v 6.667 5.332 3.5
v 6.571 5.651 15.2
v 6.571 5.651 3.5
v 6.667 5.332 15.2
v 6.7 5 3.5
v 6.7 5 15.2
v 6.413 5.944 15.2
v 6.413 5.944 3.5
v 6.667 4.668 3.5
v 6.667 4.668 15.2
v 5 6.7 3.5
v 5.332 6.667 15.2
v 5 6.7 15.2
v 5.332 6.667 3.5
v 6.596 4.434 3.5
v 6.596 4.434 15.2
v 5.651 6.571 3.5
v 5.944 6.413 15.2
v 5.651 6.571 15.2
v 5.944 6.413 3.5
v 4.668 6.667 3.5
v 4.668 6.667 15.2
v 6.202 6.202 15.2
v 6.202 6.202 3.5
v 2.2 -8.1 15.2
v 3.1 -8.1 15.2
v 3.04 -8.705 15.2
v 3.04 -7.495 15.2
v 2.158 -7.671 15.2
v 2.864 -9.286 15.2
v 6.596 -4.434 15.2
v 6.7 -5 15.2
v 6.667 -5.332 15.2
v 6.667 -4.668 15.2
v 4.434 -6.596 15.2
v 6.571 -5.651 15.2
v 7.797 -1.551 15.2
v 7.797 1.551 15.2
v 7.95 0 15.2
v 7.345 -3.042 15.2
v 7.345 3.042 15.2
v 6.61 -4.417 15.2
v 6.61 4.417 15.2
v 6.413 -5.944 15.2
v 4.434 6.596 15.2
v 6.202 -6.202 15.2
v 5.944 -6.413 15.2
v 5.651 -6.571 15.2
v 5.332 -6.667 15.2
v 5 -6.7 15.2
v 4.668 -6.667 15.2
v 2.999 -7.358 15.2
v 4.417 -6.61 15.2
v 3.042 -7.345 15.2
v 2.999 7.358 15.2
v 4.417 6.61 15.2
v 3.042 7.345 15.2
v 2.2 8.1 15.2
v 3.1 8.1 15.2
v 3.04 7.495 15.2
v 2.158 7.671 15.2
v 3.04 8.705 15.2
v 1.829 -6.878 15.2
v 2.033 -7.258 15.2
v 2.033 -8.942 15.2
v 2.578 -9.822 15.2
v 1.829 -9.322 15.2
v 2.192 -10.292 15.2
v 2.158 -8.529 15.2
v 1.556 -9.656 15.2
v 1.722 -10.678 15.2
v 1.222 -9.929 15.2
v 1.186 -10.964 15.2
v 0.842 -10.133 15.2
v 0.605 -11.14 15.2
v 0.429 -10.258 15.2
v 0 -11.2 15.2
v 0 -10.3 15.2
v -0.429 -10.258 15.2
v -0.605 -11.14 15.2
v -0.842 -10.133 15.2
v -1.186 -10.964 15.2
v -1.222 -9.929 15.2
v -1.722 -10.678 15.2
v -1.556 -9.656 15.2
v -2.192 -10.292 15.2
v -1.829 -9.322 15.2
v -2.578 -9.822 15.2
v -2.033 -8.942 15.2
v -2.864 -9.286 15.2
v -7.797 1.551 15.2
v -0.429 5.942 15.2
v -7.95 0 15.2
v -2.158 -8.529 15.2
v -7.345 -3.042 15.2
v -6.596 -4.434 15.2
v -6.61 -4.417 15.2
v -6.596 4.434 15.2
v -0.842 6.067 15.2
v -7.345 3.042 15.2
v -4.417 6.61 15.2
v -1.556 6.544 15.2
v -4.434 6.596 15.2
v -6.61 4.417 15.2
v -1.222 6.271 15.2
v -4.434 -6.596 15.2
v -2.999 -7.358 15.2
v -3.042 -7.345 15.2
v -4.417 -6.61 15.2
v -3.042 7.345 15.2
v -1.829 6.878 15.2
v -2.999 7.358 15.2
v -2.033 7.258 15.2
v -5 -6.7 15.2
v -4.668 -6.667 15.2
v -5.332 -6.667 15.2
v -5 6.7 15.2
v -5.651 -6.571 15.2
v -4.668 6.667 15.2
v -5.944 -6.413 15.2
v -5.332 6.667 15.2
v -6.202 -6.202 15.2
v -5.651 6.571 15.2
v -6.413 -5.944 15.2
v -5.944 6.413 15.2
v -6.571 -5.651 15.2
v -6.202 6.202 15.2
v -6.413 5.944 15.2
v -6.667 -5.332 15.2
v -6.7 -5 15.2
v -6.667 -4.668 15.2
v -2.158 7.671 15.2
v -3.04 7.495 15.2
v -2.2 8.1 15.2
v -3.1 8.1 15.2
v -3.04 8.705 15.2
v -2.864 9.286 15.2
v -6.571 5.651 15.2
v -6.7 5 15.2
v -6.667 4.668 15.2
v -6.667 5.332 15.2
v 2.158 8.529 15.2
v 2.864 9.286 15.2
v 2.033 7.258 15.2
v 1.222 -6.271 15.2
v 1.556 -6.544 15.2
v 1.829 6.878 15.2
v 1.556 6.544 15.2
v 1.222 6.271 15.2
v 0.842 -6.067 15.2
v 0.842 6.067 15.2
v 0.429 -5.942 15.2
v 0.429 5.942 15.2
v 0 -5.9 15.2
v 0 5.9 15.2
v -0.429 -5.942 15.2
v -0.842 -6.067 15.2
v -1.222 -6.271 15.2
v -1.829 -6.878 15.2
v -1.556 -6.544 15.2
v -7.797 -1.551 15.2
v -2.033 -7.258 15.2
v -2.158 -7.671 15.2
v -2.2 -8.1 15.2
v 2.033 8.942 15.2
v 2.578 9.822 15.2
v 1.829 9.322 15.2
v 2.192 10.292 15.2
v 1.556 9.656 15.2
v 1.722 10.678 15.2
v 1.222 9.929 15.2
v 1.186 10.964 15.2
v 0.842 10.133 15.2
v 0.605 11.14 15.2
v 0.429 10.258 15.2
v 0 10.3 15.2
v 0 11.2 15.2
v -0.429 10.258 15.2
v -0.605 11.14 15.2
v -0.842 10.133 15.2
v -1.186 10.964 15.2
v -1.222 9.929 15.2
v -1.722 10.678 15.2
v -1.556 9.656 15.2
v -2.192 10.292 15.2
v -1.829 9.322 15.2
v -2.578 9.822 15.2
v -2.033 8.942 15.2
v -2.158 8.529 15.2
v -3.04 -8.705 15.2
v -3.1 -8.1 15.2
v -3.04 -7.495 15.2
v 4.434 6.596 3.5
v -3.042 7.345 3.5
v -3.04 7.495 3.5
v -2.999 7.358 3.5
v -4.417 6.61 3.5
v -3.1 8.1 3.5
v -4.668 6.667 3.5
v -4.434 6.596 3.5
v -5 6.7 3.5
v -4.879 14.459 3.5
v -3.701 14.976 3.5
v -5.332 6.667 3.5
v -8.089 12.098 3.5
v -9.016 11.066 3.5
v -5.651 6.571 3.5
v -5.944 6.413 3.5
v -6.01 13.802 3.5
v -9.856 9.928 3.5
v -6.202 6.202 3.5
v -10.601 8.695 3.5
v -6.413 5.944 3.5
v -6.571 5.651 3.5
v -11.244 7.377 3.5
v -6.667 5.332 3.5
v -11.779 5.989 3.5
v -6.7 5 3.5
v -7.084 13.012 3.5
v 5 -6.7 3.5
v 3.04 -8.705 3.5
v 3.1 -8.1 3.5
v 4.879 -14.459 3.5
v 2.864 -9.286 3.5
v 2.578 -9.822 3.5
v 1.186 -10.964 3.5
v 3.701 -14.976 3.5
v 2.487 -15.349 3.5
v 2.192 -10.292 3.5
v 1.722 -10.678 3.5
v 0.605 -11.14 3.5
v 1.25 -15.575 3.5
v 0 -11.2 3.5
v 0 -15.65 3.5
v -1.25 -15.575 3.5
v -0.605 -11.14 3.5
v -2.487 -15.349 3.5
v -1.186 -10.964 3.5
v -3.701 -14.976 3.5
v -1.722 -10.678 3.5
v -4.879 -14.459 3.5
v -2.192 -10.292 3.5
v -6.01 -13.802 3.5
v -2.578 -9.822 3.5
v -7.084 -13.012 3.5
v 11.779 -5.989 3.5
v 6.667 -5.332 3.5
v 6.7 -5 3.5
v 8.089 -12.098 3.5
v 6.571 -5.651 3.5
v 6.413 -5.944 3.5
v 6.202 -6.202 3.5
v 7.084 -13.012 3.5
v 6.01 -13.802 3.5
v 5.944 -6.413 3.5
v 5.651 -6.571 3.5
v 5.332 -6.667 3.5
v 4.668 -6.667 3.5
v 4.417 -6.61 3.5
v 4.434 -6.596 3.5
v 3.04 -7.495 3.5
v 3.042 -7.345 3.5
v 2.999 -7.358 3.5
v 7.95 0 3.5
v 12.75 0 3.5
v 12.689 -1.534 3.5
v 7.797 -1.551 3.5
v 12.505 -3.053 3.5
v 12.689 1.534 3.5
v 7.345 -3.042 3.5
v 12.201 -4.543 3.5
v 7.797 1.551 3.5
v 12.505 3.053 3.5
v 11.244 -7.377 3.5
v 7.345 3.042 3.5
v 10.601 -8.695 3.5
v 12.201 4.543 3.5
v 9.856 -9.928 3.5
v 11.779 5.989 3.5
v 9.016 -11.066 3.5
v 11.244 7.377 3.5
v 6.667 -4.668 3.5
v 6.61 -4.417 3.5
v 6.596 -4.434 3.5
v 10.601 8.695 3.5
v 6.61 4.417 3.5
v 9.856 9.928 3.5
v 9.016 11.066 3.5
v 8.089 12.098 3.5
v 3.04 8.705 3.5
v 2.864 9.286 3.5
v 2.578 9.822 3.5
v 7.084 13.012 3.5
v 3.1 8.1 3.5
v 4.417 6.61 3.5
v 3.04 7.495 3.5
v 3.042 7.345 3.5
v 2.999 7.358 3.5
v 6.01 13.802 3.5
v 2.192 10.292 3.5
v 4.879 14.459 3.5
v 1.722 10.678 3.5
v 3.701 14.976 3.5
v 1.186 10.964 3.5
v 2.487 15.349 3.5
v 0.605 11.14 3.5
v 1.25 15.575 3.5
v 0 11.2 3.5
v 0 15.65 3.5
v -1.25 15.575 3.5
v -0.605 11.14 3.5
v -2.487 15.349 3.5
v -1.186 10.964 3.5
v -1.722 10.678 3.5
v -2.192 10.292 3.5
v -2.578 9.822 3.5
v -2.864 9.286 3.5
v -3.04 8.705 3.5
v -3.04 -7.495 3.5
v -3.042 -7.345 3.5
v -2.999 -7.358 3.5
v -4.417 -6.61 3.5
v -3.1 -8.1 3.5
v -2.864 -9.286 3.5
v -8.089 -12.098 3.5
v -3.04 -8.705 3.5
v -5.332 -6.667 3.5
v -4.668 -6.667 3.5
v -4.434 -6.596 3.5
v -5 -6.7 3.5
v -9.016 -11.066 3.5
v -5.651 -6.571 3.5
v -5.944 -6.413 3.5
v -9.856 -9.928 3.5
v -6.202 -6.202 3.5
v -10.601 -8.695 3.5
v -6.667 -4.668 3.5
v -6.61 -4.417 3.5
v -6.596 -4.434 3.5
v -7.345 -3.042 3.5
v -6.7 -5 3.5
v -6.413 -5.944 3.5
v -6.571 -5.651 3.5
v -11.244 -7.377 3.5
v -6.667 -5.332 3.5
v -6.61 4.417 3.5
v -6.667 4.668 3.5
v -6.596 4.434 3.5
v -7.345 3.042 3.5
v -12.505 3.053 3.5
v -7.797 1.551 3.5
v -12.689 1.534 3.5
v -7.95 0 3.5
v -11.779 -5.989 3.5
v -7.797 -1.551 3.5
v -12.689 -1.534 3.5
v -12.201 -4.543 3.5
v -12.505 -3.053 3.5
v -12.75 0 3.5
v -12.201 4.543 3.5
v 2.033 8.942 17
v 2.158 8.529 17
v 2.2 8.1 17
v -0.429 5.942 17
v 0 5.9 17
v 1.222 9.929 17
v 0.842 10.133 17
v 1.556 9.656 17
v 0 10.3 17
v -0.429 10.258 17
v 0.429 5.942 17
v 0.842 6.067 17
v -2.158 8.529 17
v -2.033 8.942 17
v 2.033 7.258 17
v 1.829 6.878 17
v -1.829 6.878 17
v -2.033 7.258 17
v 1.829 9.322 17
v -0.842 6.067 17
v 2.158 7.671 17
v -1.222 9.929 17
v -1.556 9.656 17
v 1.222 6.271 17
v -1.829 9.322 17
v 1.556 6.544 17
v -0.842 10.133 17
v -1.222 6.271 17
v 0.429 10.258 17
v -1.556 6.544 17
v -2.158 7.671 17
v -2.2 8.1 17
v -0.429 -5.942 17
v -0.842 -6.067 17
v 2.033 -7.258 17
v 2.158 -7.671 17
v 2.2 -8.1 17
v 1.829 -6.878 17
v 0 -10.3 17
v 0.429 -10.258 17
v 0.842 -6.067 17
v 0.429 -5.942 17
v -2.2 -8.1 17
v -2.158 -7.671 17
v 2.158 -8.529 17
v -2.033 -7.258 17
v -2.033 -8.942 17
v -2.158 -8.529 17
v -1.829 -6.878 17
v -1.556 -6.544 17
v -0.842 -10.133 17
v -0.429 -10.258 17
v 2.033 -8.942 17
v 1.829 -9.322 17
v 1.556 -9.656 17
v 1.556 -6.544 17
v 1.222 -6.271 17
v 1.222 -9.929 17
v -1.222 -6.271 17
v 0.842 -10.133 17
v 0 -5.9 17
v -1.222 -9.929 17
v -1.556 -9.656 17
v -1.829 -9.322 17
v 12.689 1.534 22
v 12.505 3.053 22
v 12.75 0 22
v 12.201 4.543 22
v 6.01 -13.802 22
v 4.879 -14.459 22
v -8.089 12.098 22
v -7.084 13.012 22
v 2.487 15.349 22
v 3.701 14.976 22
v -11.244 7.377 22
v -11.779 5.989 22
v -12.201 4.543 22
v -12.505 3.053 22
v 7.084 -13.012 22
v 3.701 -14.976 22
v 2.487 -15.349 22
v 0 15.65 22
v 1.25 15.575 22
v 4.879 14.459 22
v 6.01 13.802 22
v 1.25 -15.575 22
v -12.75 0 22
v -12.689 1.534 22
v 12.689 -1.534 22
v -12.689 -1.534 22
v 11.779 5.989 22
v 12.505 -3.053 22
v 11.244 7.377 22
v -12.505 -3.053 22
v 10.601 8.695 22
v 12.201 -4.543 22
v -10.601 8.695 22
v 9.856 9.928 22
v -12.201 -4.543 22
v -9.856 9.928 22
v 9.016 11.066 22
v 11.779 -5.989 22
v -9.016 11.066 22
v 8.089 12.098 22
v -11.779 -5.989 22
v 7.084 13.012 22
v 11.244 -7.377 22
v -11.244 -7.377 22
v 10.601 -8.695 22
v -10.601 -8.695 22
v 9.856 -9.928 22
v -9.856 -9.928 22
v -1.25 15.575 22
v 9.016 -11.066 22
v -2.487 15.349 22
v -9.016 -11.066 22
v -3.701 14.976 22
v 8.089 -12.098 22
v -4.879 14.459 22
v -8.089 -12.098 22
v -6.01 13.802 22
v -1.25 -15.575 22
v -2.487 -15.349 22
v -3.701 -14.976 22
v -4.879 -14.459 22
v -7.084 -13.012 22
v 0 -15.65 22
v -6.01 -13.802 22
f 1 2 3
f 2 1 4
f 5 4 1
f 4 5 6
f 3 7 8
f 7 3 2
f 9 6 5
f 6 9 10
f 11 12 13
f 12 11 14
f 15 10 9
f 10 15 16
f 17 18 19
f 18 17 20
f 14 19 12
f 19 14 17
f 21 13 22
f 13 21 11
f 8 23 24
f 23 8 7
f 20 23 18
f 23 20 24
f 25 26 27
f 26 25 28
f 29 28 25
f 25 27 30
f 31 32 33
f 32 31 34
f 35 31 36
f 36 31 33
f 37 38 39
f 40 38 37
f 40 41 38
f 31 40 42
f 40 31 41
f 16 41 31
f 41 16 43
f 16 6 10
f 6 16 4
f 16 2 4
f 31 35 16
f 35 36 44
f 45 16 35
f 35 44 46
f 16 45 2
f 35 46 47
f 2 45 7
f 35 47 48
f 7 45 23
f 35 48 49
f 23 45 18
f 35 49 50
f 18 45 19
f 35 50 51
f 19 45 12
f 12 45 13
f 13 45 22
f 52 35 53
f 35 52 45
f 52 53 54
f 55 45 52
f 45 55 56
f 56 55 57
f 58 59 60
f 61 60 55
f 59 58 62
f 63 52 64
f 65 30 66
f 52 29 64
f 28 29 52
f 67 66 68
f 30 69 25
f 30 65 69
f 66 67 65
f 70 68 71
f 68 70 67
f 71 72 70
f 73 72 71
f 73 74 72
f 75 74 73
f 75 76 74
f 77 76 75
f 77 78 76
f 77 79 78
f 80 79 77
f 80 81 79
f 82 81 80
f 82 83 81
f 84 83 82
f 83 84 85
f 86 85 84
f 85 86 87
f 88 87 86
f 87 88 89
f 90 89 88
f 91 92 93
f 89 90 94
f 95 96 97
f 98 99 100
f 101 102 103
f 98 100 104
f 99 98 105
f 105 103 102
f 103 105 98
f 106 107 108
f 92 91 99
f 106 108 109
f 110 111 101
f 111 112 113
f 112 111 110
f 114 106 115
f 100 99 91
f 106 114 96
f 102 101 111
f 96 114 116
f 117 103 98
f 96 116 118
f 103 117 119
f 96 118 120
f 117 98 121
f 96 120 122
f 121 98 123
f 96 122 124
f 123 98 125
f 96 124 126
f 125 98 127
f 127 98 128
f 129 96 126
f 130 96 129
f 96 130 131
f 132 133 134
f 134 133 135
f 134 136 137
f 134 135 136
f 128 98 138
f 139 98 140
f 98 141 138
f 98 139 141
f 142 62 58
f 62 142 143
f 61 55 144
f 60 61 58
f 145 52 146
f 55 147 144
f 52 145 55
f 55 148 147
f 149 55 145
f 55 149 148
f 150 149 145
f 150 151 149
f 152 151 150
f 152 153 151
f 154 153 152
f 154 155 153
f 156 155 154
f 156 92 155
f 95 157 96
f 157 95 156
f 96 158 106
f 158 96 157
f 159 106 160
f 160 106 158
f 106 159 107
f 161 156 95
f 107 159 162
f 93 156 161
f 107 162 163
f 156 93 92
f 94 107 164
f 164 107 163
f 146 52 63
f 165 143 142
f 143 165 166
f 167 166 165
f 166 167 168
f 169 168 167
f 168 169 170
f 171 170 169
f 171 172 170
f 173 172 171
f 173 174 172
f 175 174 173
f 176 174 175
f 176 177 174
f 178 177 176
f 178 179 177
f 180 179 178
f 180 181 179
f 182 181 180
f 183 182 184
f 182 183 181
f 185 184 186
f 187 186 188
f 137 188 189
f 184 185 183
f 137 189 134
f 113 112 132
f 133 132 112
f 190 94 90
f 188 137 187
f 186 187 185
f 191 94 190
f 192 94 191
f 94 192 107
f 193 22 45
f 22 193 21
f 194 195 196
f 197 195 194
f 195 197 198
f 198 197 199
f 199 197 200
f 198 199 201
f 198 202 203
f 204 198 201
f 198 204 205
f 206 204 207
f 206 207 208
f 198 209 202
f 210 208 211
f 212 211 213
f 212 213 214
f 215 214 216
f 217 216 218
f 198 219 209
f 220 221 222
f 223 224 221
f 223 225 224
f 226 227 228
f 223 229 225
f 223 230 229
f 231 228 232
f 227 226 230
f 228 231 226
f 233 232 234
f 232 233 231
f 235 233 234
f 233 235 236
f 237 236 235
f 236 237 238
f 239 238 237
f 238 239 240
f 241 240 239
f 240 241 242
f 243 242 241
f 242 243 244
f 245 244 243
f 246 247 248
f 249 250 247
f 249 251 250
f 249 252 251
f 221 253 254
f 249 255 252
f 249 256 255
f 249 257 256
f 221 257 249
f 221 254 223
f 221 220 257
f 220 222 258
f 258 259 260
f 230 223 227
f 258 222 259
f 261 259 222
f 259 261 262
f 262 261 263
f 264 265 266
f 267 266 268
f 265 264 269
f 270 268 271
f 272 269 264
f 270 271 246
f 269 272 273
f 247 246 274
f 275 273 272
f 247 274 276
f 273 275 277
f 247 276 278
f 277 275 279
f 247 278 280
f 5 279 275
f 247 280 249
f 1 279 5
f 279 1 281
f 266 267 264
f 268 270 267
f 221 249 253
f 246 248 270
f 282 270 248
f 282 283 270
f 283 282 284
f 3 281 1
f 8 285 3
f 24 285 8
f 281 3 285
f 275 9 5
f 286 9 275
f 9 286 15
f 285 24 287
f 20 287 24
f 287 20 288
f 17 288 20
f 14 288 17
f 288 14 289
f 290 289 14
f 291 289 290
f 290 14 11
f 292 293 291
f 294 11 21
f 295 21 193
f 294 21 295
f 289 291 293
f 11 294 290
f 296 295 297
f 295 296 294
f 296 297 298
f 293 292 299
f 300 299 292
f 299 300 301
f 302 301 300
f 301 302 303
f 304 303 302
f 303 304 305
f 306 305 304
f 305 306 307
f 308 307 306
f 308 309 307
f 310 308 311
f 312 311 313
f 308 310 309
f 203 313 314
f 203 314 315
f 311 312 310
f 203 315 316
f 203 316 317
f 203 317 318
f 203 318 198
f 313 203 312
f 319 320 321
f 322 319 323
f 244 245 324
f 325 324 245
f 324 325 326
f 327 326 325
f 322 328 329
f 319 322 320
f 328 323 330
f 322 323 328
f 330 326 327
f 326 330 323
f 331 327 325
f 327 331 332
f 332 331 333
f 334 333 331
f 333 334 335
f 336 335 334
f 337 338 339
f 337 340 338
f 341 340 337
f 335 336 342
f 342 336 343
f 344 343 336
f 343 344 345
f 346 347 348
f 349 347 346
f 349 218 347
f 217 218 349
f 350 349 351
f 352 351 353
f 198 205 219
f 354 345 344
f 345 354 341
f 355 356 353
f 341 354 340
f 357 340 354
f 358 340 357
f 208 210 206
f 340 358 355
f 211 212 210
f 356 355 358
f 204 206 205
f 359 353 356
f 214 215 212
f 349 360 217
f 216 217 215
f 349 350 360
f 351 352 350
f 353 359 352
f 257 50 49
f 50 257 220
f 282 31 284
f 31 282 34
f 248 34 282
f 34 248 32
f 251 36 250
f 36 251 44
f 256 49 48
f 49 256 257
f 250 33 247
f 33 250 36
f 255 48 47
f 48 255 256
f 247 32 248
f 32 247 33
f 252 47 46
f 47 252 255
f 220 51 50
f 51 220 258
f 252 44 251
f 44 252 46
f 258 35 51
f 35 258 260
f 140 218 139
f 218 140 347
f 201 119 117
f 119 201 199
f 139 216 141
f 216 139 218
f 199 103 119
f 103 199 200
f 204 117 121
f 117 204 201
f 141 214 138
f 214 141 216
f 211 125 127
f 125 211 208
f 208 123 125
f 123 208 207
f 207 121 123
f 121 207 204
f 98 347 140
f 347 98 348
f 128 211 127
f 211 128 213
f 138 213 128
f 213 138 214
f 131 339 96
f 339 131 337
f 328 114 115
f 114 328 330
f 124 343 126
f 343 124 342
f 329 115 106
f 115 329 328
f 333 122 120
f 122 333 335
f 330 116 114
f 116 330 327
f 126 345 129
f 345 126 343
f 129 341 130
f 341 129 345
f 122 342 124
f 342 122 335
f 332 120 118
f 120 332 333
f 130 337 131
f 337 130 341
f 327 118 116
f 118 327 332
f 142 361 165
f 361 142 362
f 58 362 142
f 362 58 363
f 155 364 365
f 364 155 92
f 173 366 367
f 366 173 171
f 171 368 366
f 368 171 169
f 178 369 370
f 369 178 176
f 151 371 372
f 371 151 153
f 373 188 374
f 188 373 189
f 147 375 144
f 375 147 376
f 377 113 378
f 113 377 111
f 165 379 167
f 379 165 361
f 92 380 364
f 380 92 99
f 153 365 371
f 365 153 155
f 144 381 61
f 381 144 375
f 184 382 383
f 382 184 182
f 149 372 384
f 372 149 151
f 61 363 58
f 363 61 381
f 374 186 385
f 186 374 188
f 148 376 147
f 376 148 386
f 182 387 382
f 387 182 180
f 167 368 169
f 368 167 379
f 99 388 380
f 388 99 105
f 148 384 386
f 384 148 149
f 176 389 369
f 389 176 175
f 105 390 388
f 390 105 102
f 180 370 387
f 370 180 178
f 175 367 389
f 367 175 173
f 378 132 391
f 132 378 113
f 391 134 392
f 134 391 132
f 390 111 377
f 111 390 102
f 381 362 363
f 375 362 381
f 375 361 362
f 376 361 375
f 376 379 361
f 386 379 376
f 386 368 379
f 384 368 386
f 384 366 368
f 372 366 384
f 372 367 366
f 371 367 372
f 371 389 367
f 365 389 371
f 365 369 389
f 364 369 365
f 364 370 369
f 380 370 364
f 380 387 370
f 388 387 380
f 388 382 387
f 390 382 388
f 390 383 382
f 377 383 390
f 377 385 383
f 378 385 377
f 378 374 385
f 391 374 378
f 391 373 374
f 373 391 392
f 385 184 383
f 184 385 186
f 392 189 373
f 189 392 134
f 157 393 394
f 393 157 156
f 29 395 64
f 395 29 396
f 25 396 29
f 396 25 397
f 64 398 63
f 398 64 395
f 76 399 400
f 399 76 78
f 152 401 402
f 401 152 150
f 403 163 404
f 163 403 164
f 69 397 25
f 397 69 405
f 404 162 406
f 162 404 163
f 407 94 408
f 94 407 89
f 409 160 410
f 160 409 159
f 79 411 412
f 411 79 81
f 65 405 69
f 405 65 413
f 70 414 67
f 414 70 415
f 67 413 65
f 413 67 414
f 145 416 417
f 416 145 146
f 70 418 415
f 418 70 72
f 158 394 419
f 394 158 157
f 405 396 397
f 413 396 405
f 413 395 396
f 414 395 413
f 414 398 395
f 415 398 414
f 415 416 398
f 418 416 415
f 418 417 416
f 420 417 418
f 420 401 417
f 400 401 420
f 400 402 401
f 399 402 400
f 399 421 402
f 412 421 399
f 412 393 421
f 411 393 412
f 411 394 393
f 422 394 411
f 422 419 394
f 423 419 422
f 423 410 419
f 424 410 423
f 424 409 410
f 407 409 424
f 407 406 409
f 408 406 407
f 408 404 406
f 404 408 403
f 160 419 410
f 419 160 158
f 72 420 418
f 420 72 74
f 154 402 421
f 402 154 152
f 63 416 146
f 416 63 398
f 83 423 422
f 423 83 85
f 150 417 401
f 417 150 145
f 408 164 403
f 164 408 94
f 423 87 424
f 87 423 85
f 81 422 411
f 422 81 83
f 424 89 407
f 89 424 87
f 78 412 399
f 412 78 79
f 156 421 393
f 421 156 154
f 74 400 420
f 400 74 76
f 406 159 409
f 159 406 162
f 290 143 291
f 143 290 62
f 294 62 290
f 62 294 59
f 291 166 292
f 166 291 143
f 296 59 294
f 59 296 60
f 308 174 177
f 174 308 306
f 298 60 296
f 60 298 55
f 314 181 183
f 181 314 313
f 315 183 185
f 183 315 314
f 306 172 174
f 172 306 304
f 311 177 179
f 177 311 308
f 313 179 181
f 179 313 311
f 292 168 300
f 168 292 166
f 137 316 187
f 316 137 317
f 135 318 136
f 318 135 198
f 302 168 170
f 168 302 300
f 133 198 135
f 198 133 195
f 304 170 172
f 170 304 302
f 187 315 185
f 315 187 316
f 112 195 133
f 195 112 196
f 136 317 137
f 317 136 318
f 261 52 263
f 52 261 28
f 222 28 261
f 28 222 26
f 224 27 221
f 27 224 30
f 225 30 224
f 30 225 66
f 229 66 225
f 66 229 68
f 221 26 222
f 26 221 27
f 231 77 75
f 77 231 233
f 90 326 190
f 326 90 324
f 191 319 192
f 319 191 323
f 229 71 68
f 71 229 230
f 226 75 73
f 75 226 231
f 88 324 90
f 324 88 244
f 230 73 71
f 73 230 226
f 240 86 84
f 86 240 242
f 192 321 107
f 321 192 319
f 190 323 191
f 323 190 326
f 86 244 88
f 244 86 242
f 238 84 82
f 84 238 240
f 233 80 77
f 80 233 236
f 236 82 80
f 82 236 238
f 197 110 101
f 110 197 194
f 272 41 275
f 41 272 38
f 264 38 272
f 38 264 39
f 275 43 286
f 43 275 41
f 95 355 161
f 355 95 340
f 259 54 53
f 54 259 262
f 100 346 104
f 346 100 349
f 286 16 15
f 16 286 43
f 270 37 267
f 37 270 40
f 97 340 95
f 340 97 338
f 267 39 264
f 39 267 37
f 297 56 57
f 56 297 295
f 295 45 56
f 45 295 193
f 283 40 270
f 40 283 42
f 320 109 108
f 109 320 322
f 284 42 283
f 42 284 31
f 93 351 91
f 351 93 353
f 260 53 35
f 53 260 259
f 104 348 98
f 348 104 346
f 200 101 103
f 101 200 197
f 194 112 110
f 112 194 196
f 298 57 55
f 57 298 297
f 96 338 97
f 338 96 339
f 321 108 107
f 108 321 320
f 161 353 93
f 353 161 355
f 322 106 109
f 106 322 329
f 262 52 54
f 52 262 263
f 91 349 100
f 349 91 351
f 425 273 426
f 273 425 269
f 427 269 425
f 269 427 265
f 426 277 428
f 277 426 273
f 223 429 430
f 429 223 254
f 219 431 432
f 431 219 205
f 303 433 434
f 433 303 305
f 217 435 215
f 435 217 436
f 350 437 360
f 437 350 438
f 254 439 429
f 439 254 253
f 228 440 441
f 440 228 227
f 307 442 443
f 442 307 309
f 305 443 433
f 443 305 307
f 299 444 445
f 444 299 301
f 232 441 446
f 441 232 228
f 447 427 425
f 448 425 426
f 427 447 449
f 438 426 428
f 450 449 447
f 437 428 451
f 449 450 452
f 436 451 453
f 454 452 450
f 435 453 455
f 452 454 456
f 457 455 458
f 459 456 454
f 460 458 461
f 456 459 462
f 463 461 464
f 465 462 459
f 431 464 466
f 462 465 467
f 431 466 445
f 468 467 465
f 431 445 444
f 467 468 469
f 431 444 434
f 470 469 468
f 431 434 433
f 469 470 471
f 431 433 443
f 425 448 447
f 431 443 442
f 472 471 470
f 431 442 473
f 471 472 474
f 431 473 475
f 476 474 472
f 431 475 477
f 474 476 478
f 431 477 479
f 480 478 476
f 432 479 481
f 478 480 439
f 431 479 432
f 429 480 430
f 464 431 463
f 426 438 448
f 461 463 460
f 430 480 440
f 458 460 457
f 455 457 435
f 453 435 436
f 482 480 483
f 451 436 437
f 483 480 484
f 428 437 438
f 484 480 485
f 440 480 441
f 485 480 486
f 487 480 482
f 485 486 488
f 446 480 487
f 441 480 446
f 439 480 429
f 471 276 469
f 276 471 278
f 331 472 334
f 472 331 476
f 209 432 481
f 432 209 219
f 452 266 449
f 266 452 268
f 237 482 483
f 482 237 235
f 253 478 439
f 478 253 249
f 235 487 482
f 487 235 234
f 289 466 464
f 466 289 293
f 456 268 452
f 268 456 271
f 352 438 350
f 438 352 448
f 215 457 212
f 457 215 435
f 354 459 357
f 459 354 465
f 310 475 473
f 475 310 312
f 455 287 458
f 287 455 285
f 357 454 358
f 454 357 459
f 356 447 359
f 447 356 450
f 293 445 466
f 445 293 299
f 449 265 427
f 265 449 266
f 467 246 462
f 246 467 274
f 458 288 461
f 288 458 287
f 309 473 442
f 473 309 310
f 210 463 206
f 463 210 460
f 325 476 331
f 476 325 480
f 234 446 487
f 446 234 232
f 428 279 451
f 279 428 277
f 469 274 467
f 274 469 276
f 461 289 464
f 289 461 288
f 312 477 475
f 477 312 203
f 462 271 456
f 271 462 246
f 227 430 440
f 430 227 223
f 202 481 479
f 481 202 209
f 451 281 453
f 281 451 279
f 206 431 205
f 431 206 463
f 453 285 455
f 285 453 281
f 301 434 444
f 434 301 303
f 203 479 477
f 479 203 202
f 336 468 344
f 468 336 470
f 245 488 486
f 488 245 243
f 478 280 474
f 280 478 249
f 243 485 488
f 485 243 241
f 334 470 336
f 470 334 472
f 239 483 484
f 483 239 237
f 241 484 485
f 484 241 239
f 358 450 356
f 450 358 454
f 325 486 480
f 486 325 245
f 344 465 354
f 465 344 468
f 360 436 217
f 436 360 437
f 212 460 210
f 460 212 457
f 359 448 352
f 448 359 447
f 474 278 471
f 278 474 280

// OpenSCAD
    rayon_bille=6;
    rayon_fixation_vis=2.9;
    rayon_corps=15.5/2;
    rayon_tete_vis=2;
    hauteur_corps=11.5;
    hauteur_fixation_vis=max(8.2,hauteur_corps);
    hauteur=15;
    largeur=22;
    hauteur_tete_vis=1.8;
    cote_carre=5;
    diamettre_petite_bille=3;


module bille(security=0) {
    //petite bille
    translate([cote_carre,cote_carre,hauteur-hauteur_corps]){
        cylinder(hauteur_corps+security,d=diamettre_petite_bille+2*security,$fn=32);
    }
    translate([cote_carre,-cote_carre,hauteur-hauteur_corps]){
        cylinder(hauteur_corps+security,d=diamettre_petite_bille+2*security,$fn=32);
    }
   translate([-cote_carre,cote_carre,hauteur-hauteur_corps]){
        cylinder(hauteur_corps+security,d=diamettre_petite_bille+2*security,$fn=32);
    }
    translate([-cote_carre,-cote_carre,hauteur-hauteur_corps]){
        cylinder(hauteur_corps+security,d=diamettre_petite_bille+2*security,$fn=32);
    }
    
    decallage_centre_vis=(largeur-(2*rayon_corps)-(2*rayon_fixation_vis))/2;
    //tete vis droite
    translate([0,decallage_centre_vis+rayon_corps,hauteur]){
        cylinder(hauteur_tete_vis+security,d=2*(rayon_tete_vis+security),$fn=32);
    }
     //tete vis gauche
    translate([0,-1*(decallage_centre_vis+rayon_corps),hauteur]){
        cylinder(hauteur_tete_vis+security,d=2*(rayon_tete_vis+security),$fn=32);
    }
   //fixation vis droite
    translate([0,decallage_centre_vis+rayon_corps,hauteur-hauteur_fixation_vis]){
        cylinder(hauteur_fixation_vis+security,d=2*(rayon_fixation_vis+security),$fn=32);
    }
    //fixation vis gauche
    translate([0,-1*(decallage_centre_vis+rayon_corps),hauteur-hauteur_fixation_vis]){
        cylinder(hauteur_fixation_vis+security,d=2*(rayon_fixation_vis+security),$fn=32);
    }
    //corps
    translate([0,0,hauteur-hauteur_corps]){
        cylinder(hauteur_corps+security,d=2*(rayon_corps+security),$fn=32);
    }
    //bille
    translate([0,0,rayon_bille]){
        sphere(rayon_bille);
    }
}

module bille_box(size=5, security=0.2) {
   difference() {
       //translate([-(rayon_corps+size),-(rayon_corps+rayon_fixation_vis+size),hauteur-hauteur_corps]) cube([2*(rayon_corps+size),2*(rayon_corps+rayon_fixation_vis+size), hauteur_corps+hauteur_tete_vis+security]);
       translate([0,0,hauteur-hauteur_corps]) resize([2*(rayon_corps+size),0,0]) cylinder(hauteur_corps+hauteur_tete_vis+security+size,d=2*(rayon_corps+rayon_fixation_vis+size),$fn=64);
       #bille(security);
   }
}

bille_box(5,0.2);
